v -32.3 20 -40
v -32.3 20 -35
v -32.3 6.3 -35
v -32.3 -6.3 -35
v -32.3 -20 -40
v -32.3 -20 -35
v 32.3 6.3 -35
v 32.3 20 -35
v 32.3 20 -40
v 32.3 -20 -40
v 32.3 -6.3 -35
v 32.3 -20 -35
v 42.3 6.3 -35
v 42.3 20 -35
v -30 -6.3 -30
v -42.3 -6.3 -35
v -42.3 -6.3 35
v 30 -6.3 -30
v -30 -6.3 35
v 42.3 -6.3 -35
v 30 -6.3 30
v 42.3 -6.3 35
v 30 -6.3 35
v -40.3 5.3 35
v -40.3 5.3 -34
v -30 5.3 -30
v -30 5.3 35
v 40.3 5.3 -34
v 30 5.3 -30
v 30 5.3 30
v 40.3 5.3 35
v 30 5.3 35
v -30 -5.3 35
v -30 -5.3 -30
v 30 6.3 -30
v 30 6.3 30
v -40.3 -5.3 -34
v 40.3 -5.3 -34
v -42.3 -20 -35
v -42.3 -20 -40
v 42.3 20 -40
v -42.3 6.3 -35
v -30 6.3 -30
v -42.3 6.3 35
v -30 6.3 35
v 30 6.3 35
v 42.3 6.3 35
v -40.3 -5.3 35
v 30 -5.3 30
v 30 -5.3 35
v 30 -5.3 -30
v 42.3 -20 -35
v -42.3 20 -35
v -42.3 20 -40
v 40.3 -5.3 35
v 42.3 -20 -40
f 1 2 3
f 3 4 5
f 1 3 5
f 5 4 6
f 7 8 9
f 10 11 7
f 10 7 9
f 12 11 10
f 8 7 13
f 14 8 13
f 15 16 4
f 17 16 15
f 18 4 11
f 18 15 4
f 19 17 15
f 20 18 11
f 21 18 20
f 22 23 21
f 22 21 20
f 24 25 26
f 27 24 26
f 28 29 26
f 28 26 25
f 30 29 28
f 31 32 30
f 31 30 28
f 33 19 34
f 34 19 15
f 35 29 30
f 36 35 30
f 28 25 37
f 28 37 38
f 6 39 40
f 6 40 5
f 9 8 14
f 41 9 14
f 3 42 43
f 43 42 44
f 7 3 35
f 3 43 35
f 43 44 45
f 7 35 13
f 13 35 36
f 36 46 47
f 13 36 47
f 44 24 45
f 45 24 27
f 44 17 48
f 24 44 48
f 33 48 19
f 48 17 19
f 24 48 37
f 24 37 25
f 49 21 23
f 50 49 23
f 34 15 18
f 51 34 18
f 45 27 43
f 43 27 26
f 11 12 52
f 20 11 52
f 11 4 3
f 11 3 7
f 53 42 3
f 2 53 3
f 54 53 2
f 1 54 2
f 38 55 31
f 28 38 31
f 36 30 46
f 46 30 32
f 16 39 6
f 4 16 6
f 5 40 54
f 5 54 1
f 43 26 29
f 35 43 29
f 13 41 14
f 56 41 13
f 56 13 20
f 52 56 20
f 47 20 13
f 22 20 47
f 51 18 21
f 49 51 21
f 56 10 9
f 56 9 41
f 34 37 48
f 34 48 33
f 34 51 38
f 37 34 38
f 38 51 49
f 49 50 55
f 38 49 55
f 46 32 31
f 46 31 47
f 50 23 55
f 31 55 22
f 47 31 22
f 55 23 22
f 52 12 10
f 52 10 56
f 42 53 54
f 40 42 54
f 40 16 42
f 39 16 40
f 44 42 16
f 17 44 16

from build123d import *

# Parameters (mm, degrees)
F0_W     = 84.6
F0_H     = 70
F1_DEPTH = 6.3
F2_DEPTH = 6.3
F3_W     = 80.6
F3_H     = 10.6
F4_DEPTH = 69
F6_DEPTH = 25
F7_W     = 10
F7_H     = 40
F8_DEPTH = 5


# Not quite as in the source:
# - ends of sketch curves that miss each other by under 0.0002 mm in the source are joined


with BuildPart() as f1:
    # F0 (on Front) → F1 (new body)
    with BuildSketch(Plane.XZ):
        Rectangle(F0_W, F0_H)
    extrude(amount=F1_DEPTH)

    # F0 (on Front) → F2 (join)
    with BuildSketch(Plane.XZ):
        Rectangle(F0_W, F0_H)
    extrude(amount=-F2_DEPTH)

    # F3 (on face) → F4 (cut)
    with BuildSketch(Plane.XY.offset(35)):
        Rectangle(F3_W, F3_H)
    extrude(amount=-F4_DEPTH, mode=Mode.SUBTRACT)

    # F5 (on face) → F6 (cut)
    with BuildSketch(Plane.XZ.offset(6.3)):
        Polygon((-30, 30), (-30, -30), (30, -30), (30, 30), (30.0000030547, 35), (-30, 35), align=None)
    extrude(amount=-F6_DEPTH, mode=Mode.SUBTRACT)

    # F7 (on face) → F8 (join)
    with BuildSketch(Plane(origin=(0, 0, -35), x_dir=(1, 0, 0), z_dir=(0, 0, -1))):
        with Locations((-37.3, 0)):
            Rectangle(F7_W, F7_H)
        with Locations((37.3, 0)):
            Rectangle(F7_W, F7_H)
    extrude(amount=F8_DEPTH)


solid = f1.part
